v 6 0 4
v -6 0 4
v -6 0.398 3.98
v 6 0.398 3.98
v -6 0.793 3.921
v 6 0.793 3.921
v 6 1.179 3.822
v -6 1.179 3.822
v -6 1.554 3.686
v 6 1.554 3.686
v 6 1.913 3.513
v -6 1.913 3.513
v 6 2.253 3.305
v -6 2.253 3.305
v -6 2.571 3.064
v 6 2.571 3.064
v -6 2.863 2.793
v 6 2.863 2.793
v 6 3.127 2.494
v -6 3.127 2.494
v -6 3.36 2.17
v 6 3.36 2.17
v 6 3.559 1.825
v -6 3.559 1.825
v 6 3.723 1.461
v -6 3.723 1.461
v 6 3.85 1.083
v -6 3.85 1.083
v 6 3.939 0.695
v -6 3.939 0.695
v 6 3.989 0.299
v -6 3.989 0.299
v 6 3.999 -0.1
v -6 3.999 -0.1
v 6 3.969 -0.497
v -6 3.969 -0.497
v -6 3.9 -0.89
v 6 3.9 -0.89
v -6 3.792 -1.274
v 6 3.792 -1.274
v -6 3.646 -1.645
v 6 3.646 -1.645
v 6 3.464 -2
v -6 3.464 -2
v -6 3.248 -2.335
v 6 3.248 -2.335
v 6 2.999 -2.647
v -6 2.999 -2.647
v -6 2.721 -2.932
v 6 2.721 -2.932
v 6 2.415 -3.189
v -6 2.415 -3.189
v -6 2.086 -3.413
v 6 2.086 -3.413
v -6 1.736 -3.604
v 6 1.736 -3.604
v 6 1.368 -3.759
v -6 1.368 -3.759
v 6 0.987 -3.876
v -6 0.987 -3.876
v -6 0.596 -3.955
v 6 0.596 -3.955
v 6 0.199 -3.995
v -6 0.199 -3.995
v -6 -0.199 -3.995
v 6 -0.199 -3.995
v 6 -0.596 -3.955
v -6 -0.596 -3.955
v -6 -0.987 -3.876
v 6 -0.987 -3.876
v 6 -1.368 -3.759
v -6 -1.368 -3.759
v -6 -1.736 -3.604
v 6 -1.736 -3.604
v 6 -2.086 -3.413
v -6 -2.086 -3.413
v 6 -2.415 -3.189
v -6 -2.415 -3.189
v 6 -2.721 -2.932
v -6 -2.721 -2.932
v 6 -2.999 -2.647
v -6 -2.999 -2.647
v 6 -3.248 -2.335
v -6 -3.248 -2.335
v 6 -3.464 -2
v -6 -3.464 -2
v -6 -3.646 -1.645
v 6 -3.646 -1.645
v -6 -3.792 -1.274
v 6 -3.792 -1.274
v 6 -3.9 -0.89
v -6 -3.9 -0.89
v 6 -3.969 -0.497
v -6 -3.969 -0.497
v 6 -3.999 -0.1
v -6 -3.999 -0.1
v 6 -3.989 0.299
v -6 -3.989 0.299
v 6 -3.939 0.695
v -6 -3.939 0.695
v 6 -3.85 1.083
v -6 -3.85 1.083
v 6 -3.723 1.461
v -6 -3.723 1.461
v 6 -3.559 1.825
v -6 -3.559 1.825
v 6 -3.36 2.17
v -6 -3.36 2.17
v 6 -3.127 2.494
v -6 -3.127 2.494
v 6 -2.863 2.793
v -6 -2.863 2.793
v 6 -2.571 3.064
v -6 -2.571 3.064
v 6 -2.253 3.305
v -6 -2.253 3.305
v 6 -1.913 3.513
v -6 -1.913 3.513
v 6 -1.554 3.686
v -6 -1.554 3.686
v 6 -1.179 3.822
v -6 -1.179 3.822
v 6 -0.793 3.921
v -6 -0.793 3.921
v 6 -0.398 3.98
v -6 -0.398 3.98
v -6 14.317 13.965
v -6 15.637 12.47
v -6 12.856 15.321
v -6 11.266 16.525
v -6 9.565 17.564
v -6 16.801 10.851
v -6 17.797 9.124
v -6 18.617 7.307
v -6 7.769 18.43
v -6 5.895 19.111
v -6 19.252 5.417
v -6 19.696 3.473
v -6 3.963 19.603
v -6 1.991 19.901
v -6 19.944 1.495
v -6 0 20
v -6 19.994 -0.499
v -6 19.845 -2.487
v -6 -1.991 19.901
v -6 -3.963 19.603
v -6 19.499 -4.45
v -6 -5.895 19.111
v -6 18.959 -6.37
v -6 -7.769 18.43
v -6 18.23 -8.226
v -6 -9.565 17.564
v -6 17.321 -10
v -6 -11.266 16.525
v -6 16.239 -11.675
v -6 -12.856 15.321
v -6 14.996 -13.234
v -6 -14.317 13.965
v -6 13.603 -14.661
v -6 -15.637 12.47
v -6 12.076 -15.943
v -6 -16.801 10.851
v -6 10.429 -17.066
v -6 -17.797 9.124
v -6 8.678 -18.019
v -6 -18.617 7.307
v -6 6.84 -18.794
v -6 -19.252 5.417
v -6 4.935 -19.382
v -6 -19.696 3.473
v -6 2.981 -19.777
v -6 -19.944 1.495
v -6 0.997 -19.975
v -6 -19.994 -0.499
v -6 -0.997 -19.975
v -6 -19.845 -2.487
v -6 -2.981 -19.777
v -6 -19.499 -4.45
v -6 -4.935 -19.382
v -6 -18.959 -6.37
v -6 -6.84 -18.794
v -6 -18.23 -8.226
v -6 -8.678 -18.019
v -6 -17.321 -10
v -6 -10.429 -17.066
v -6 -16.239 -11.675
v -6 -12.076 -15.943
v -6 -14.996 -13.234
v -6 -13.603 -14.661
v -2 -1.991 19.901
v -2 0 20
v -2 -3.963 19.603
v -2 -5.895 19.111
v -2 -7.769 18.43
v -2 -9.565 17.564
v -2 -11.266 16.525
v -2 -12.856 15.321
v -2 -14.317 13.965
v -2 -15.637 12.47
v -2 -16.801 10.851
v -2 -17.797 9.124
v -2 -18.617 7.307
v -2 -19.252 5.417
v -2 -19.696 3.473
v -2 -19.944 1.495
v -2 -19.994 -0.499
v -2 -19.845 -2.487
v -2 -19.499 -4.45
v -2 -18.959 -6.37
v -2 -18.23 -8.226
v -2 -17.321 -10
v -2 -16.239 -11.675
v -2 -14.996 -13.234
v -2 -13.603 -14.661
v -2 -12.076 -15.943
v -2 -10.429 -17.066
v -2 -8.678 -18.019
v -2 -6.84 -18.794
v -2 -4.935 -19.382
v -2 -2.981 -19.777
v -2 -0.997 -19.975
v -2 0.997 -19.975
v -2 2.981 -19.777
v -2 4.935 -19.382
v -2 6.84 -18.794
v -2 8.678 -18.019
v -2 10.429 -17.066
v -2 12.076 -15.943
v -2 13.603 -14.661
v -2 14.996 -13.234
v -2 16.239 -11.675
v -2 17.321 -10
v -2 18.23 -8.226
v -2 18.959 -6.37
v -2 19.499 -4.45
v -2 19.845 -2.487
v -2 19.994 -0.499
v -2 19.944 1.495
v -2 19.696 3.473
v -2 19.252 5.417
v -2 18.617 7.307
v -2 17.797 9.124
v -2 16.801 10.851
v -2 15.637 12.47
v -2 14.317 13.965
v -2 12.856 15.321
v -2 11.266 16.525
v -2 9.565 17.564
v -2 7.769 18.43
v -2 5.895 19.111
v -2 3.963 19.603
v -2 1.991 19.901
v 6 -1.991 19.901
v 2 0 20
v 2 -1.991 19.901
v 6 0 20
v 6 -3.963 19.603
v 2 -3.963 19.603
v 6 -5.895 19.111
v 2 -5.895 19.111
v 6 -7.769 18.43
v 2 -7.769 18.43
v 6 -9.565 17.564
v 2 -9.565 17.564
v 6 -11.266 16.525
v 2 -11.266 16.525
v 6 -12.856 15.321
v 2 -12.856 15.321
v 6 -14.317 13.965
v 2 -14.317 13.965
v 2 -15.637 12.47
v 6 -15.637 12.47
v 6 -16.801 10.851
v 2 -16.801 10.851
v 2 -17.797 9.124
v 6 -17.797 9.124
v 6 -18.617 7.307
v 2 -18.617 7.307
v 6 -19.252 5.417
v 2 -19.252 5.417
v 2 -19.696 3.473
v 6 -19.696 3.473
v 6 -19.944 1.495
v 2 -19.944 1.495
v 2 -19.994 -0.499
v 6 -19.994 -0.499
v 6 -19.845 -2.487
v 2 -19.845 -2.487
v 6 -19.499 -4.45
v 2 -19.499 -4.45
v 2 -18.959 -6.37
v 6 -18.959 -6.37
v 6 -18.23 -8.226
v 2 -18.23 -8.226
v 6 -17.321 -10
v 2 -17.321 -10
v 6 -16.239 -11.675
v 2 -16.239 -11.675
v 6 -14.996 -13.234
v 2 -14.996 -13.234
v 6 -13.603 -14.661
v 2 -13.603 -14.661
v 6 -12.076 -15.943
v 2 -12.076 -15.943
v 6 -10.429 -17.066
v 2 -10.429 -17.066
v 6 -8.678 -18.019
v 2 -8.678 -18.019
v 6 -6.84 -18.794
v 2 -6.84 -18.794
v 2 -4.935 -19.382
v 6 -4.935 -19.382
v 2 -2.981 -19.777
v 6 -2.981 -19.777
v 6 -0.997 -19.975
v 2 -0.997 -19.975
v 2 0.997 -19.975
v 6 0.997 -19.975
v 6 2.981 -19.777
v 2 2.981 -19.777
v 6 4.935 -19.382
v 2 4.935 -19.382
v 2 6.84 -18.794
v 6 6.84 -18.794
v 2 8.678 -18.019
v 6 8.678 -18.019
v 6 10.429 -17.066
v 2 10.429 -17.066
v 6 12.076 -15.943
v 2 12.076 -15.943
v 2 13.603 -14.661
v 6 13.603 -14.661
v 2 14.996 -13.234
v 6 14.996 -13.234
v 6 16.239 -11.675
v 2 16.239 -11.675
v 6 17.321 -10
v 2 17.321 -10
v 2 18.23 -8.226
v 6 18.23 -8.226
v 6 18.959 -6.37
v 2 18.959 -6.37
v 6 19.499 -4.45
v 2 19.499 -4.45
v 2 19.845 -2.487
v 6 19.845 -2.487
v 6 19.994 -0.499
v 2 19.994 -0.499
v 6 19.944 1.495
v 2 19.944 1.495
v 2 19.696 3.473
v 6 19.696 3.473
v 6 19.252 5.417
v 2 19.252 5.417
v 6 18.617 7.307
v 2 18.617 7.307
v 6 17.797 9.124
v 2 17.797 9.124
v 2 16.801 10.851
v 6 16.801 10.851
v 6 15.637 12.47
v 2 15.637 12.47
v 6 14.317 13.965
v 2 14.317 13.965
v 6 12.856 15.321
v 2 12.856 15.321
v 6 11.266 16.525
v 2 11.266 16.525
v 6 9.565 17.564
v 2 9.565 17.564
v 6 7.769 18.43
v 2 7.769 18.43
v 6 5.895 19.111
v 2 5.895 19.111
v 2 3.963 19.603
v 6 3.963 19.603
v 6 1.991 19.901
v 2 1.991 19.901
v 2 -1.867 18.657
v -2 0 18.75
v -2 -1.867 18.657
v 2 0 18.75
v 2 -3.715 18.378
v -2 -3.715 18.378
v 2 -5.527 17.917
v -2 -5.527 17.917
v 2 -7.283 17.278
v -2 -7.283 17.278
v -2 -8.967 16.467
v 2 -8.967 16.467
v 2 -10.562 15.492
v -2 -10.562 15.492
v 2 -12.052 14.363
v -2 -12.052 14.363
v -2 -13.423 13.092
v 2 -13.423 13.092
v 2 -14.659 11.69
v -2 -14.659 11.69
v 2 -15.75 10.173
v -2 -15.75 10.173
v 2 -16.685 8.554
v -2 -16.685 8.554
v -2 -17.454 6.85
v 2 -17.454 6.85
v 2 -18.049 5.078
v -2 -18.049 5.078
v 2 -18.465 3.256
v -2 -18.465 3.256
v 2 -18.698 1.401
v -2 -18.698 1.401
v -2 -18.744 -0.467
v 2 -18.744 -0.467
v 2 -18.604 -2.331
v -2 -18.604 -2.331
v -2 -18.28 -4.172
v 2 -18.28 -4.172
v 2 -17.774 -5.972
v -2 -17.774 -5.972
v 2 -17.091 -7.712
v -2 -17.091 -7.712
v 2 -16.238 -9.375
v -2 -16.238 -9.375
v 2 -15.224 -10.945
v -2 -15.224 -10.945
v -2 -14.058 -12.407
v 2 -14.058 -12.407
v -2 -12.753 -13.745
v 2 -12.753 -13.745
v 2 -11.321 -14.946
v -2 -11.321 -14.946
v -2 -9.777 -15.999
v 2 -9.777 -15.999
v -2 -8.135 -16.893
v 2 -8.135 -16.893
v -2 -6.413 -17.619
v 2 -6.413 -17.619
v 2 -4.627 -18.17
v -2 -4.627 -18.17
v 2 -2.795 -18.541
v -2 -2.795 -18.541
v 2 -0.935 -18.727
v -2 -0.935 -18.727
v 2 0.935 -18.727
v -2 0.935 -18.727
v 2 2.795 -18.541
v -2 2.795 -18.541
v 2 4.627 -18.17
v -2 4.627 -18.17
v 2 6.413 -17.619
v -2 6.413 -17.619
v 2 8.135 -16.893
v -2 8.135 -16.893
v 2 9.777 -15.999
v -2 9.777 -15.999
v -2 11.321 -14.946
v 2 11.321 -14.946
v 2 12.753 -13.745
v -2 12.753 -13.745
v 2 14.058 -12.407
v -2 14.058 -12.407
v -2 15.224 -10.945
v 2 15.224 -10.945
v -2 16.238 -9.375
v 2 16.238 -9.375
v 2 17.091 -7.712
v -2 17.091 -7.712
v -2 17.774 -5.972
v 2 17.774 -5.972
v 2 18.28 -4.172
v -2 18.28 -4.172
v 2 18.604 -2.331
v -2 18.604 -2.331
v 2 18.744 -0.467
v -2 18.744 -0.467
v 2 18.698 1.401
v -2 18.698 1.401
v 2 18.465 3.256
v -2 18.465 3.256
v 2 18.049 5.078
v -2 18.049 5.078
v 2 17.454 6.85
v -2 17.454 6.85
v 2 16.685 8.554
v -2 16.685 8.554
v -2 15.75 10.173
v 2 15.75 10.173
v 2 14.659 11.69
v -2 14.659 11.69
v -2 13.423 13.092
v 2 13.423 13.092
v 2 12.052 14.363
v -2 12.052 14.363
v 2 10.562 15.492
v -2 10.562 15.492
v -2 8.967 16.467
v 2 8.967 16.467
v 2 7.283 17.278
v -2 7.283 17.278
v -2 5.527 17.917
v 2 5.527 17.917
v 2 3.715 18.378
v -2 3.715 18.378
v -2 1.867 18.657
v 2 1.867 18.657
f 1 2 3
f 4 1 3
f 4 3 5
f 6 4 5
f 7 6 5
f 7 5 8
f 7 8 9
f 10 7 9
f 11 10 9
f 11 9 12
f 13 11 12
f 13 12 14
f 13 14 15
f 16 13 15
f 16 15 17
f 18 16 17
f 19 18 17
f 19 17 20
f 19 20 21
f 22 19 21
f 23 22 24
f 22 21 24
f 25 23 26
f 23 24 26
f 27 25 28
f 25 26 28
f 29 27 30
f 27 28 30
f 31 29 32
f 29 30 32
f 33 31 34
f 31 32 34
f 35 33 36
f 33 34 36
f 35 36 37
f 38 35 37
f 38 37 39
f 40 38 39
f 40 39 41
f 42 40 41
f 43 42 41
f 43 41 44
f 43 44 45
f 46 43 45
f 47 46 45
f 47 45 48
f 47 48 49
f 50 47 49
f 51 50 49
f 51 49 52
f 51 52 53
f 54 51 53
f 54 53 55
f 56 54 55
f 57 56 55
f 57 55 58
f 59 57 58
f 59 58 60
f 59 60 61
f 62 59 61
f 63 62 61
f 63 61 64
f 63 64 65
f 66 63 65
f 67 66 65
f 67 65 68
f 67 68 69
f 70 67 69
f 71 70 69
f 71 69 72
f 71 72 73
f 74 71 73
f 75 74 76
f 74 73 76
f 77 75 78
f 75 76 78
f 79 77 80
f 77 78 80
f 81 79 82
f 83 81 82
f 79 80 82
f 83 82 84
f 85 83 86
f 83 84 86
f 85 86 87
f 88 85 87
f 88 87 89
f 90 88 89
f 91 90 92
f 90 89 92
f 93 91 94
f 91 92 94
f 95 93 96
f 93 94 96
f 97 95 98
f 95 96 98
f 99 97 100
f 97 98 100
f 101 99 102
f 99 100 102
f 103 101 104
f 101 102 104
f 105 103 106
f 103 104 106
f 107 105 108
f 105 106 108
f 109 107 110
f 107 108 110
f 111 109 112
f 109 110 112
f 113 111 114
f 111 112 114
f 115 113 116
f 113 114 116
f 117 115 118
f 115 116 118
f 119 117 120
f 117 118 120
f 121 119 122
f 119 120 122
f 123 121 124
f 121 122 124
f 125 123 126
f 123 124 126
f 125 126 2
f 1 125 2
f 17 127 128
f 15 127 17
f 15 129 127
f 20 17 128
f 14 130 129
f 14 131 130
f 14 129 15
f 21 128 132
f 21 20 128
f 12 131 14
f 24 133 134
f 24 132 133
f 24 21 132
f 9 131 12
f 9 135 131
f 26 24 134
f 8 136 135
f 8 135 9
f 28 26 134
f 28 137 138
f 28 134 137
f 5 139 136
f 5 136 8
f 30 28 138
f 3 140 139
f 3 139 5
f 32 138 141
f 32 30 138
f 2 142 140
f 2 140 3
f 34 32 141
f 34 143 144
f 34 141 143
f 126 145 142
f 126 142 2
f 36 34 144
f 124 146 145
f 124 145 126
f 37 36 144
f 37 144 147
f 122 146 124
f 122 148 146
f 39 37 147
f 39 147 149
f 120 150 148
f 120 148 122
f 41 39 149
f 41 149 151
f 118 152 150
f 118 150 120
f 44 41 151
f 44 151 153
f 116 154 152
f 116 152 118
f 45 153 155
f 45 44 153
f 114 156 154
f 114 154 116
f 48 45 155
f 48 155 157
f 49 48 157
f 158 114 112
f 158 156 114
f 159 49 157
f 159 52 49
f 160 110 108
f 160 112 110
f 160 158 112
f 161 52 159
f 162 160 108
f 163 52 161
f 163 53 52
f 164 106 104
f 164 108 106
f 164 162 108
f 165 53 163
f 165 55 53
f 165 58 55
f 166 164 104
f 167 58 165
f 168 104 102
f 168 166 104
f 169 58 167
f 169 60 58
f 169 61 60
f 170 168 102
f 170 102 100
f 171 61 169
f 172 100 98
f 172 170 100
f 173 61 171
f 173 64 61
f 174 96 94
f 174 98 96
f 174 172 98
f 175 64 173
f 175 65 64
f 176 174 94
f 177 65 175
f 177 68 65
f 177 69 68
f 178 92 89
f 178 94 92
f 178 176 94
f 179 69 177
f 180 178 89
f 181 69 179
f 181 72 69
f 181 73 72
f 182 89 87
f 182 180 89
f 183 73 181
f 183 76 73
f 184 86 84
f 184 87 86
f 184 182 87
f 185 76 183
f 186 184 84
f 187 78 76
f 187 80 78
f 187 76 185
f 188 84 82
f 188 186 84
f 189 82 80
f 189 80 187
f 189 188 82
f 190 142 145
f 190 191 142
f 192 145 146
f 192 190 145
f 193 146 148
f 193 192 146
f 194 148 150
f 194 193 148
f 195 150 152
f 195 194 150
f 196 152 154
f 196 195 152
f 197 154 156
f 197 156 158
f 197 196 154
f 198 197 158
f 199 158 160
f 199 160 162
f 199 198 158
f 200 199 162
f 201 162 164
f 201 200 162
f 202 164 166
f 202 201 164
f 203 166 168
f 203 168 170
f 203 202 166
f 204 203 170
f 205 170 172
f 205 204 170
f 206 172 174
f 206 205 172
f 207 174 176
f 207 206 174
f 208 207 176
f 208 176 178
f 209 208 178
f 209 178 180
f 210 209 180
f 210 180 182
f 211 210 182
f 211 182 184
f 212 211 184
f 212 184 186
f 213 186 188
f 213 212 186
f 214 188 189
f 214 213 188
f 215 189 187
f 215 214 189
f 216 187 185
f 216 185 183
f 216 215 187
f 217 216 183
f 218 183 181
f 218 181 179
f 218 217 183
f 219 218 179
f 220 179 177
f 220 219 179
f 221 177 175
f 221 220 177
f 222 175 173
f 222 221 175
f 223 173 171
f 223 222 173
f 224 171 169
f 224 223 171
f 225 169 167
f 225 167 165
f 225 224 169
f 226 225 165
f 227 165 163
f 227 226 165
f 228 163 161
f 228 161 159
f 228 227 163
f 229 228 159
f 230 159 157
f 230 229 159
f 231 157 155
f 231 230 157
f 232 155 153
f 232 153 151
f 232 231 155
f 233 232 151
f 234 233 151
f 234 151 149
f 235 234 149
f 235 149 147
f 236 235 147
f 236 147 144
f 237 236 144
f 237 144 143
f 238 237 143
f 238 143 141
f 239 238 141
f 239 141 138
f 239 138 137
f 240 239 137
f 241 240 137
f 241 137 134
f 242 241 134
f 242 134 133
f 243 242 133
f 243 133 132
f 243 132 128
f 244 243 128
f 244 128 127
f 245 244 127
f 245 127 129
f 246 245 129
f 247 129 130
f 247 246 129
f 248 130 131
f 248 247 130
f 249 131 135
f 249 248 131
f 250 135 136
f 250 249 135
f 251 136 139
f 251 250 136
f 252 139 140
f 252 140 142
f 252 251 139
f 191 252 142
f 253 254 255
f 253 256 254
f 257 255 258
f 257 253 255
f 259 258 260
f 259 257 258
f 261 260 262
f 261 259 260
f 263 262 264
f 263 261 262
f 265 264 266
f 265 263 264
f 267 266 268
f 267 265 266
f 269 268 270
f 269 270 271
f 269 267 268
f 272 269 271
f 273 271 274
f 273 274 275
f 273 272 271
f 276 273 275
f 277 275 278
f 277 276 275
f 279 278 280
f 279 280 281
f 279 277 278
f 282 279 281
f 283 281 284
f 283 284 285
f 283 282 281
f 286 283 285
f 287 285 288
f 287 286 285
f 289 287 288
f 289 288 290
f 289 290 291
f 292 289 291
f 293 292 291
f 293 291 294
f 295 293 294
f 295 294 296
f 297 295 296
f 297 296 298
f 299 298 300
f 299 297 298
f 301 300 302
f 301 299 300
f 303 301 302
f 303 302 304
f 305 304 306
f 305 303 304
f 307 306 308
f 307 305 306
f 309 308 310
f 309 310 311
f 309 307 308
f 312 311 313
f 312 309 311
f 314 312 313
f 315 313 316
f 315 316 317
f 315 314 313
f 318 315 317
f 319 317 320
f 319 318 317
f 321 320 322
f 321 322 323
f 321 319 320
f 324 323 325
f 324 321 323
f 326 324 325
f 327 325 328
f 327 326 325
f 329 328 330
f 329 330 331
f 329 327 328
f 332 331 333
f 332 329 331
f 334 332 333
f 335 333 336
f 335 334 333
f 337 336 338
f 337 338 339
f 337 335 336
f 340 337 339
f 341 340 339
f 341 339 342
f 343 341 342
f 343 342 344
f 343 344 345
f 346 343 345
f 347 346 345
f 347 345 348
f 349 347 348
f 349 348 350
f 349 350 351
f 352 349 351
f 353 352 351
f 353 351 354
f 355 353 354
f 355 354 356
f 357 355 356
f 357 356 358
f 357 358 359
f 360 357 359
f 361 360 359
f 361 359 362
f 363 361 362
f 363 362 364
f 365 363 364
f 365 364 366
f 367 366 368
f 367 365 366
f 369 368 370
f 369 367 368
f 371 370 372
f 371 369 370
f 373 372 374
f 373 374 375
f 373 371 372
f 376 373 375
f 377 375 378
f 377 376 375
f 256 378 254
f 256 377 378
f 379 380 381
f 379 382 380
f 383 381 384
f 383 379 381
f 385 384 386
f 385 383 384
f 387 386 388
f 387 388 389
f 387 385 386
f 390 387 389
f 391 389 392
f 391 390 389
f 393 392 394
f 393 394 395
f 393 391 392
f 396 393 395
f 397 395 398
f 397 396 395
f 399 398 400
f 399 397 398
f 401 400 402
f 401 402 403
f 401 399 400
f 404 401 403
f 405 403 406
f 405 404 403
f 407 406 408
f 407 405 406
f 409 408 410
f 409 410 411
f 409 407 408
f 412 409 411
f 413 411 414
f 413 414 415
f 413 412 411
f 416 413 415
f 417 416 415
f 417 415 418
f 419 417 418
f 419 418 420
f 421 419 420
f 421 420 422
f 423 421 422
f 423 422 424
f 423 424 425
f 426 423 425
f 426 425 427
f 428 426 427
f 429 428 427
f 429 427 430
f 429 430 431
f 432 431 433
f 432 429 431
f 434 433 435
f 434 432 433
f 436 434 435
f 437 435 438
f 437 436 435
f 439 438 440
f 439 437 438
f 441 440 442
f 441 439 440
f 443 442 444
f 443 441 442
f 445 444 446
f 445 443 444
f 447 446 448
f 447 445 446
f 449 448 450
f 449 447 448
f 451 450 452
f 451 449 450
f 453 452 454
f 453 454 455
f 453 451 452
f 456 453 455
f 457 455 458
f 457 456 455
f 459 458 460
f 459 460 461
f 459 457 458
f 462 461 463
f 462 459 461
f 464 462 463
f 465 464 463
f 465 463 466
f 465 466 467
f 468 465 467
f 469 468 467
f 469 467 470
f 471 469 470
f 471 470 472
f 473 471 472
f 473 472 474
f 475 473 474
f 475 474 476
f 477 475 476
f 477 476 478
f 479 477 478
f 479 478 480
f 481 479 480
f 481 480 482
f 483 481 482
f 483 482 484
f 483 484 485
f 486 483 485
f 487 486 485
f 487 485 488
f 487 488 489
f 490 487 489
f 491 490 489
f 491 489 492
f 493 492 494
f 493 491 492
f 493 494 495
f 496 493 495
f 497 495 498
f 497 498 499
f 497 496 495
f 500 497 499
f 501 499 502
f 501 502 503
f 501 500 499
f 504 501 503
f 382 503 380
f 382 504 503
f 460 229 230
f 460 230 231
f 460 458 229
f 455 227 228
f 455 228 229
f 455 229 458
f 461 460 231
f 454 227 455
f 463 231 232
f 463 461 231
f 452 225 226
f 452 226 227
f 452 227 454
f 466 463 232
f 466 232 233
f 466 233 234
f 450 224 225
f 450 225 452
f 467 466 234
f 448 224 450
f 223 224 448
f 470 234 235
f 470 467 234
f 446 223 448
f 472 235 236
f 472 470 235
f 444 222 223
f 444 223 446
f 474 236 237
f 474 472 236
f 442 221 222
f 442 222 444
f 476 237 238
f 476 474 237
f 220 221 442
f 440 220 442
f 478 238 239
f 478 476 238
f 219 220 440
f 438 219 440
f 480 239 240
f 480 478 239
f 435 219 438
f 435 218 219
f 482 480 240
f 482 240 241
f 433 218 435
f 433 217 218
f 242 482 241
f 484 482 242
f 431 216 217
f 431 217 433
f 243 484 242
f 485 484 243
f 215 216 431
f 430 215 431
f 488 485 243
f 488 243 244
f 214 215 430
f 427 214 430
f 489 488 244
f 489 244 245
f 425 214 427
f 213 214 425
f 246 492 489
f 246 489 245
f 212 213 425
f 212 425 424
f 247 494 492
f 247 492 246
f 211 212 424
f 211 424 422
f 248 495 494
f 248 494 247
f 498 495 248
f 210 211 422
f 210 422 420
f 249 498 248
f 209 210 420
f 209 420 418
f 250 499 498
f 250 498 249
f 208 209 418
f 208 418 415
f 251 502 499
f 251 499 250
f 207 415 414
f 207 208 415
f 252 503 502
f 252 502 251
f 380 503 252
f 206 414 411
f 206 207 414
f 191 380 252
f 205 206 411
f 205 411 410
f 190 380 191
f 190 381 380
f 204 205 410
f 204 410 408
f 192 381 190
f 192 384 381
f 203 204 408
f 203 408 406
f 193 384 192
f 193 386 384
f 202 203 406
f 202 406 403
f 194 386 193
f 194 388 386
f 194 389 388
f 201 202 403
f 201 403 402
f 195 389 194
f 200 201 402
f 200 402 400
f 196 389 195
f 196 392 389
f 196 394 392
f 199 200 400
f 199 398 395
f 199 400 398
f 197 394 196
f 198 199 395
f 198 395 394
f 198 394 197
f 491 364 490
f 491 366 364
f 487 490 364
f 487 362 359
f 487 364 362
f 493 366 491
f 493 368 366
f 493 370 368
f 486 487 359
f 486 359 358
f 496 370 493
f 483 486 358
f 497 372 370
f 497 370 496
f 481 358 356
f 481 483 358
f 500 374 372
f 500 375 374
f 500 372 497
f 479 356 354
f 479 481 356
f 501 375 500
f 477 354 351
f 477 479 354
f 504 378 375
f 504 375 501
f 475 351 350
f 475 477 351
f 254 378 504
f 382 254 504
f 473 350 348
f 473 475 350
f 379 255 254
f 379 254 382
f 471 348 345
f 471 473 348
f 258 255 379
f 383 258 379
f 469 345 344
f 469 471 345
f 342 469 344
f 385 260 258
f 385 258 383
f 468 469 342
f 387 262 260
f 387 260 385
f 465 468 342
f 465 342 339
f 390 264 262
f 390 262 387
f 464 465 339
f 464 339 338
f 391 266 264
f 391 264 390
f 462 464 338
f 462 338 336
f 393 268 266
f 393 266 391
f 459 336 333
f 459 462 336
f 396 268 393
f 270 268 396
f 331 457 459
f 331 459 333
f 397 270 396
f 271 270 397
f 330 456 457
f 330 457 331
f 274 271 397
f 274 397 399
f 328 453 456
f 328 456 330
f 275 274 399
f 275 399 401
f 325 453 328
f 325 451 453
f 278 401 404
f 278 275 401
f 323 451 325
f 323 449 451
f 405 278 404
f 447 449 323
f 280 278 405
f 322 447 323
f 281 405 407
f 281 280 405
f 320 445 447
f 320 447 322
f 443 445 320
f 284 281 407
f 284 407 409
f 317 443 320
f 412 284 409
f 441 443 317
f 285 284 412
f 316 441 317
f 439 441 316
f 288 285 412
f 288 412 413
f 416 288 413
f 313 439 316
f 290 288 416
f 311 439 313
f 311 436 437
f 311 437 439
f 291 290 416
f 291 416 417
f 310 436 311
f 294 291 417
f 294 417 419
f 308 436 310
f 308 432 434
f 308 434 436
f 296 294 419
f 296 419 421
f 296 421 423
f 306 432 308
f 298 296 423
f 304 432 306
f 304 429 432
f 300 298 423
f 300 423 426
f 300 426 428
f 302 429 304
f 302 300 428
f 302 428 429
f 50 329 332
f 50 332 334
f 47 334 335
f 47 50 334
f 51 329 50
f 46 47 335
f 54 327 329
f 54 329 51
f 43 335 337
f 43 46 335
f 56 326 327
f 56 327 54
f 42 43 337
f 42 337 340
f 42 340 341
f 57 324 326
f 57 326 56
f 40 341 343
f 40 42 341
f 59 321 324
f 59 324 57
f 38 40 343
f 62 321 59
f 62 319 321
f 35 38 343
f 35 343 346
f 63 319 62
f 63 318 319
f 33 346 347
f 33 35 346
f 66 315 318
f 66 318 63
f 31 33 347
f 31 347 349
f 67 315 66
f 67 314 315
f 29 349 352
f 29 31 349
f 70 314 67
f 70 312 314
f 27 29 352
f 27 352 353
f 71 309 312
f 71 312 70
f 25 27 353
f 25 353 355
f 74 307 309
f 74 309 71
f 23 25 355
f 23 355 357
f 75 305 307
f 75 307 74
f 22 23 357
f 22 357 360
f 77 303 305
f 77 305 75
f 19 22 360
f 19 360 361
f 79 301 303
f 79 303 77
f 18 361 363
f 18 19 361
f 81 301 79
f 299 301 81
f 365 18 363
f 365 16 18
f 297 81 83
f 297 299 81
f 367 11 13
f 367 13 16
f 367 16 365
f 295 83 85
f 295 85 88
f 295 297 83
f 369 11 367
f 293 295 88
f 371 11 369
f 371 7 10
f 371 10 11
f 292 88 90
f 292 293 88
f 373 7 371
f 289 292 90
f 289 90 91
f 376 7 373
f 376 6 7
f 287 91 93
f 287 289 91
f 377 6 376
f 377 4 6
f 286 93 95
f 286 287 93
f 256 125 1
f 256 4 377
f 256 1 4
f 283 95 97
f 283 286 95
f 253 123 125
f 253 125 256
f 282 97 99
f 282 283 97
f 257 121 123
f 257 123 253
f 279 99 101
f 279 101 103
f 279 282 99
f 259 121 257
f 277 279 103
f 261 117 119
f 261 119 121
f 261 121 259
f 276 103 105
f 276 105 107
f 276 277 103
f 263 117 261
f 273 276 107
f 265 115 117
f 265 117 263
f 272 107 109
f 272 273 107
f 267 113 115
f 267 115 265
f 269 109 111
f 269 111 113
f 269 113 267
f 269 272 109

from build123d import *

# Parameters (mm, degrees)
SKETCH2_R          = 4
CUT_EXTRUDE1_DEPTH = 40


with BuildPart() as part:
    # Sketch1 → Revolve1 (revolve)
    with BuildSketch(Plane(origin=(0, 0, 0), x_dir=(1, 0, 0), z_dir=(0, 1, 0)), mode=Mode.PRIVATE) as revolve1_sk:
        Polygon((6, 0), (-6, 0), (-6, 20), (-2, 20), (-2, 18.75), (2, 18.75), (2, 20), (6, 20), align=None)
    revolve(revolve1_sk.sketch.rotate(Axis((-28.819039277, 0, 0), (1, 0, 0)), 180), axis=Axis((-28.819039277, 0, 0), (1, 0, 0)))

    # Sketch2 → Cut-Extrude1 (cut)
    with BuildSketch(Plane.ZY.offset(6)):
        Circle(SKETCH2_R)
    extrude(amount=-CUT_EXTRUDE1_DEPTH, mode=Mode.SUBTRACT)


solid = part.part
